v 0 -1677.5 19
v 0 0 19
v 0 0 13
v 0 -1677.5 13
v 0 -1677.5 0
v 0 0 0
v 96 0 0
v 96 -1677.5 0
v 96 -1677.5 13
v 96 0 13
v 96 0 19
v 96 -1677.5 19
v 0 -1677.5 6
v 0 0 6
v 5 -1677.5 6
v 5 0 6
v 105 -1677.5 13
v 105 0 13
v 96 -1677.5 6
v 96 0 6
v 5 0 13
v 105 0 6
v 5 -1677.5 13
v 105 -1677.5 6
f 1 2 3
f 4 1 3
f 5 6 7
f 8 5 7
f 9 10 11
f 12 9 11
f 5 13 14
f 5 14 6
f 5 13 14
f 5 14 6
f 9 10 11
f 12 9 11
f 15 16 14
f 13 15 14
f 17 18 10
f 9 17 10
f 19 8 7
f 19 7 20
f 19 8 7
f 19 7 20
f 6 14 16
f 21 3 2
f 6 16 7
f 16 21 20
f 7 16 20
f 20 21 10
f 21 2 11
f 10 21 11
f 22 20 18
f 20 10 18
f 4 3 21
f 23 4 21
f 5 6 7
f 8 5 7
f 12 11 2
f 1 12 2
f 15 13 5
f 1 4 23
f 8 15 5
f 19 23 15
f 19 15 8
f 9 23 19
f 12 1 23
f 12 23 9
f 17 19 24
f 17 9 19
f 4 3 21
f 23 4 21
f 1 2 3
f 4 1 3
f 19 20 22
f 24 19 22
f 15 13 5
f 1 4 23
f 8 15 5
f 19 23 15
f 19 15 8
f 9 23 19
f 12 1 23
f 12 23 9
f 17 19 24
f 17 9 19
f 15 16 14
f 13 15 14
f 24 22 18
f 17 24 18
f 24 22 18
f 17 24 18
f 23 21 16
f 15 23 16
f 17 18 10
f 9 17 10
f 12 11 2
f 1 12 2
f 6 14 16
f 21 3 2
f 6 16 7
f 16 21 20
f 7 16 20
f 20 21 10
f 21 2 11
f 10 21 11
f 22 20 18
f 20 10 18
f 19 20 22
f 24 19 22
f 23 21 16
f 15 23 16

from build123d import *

# Parameters (mm, degrees)
F1_DEPTH = 1677.5
F2_DEPTH = 1677.5


with BuildPart() as f1:
    # F0 (on Front) → F1 (new body)
    with BuildSketch(Plane.XZ):
        Polygon((0, 6), (0, 0), (96, 0), (96, 6), (105, 6), (105, 13), (96, 13), (96, 19), (0, 19), (0, 13), (5, 13), (5, 6), align=None)
    extrude(amount=F1_DEPTH)


with BuildPart() as f2:
    # F0 (on Front) → F2 (new body)
    with BuildSketch(Plane.XZ):
        Polygon((0, 6), (0, 0), (96, 0), (96, 6), (105, 6), (105, 13), (96, 13), (96, 19), (0, 19), (0, 13), (5, 13), (5, 6), align=None)
    extrude(amount=F2_DEPTH)


solid = Compound([f1.part, f2.part])
